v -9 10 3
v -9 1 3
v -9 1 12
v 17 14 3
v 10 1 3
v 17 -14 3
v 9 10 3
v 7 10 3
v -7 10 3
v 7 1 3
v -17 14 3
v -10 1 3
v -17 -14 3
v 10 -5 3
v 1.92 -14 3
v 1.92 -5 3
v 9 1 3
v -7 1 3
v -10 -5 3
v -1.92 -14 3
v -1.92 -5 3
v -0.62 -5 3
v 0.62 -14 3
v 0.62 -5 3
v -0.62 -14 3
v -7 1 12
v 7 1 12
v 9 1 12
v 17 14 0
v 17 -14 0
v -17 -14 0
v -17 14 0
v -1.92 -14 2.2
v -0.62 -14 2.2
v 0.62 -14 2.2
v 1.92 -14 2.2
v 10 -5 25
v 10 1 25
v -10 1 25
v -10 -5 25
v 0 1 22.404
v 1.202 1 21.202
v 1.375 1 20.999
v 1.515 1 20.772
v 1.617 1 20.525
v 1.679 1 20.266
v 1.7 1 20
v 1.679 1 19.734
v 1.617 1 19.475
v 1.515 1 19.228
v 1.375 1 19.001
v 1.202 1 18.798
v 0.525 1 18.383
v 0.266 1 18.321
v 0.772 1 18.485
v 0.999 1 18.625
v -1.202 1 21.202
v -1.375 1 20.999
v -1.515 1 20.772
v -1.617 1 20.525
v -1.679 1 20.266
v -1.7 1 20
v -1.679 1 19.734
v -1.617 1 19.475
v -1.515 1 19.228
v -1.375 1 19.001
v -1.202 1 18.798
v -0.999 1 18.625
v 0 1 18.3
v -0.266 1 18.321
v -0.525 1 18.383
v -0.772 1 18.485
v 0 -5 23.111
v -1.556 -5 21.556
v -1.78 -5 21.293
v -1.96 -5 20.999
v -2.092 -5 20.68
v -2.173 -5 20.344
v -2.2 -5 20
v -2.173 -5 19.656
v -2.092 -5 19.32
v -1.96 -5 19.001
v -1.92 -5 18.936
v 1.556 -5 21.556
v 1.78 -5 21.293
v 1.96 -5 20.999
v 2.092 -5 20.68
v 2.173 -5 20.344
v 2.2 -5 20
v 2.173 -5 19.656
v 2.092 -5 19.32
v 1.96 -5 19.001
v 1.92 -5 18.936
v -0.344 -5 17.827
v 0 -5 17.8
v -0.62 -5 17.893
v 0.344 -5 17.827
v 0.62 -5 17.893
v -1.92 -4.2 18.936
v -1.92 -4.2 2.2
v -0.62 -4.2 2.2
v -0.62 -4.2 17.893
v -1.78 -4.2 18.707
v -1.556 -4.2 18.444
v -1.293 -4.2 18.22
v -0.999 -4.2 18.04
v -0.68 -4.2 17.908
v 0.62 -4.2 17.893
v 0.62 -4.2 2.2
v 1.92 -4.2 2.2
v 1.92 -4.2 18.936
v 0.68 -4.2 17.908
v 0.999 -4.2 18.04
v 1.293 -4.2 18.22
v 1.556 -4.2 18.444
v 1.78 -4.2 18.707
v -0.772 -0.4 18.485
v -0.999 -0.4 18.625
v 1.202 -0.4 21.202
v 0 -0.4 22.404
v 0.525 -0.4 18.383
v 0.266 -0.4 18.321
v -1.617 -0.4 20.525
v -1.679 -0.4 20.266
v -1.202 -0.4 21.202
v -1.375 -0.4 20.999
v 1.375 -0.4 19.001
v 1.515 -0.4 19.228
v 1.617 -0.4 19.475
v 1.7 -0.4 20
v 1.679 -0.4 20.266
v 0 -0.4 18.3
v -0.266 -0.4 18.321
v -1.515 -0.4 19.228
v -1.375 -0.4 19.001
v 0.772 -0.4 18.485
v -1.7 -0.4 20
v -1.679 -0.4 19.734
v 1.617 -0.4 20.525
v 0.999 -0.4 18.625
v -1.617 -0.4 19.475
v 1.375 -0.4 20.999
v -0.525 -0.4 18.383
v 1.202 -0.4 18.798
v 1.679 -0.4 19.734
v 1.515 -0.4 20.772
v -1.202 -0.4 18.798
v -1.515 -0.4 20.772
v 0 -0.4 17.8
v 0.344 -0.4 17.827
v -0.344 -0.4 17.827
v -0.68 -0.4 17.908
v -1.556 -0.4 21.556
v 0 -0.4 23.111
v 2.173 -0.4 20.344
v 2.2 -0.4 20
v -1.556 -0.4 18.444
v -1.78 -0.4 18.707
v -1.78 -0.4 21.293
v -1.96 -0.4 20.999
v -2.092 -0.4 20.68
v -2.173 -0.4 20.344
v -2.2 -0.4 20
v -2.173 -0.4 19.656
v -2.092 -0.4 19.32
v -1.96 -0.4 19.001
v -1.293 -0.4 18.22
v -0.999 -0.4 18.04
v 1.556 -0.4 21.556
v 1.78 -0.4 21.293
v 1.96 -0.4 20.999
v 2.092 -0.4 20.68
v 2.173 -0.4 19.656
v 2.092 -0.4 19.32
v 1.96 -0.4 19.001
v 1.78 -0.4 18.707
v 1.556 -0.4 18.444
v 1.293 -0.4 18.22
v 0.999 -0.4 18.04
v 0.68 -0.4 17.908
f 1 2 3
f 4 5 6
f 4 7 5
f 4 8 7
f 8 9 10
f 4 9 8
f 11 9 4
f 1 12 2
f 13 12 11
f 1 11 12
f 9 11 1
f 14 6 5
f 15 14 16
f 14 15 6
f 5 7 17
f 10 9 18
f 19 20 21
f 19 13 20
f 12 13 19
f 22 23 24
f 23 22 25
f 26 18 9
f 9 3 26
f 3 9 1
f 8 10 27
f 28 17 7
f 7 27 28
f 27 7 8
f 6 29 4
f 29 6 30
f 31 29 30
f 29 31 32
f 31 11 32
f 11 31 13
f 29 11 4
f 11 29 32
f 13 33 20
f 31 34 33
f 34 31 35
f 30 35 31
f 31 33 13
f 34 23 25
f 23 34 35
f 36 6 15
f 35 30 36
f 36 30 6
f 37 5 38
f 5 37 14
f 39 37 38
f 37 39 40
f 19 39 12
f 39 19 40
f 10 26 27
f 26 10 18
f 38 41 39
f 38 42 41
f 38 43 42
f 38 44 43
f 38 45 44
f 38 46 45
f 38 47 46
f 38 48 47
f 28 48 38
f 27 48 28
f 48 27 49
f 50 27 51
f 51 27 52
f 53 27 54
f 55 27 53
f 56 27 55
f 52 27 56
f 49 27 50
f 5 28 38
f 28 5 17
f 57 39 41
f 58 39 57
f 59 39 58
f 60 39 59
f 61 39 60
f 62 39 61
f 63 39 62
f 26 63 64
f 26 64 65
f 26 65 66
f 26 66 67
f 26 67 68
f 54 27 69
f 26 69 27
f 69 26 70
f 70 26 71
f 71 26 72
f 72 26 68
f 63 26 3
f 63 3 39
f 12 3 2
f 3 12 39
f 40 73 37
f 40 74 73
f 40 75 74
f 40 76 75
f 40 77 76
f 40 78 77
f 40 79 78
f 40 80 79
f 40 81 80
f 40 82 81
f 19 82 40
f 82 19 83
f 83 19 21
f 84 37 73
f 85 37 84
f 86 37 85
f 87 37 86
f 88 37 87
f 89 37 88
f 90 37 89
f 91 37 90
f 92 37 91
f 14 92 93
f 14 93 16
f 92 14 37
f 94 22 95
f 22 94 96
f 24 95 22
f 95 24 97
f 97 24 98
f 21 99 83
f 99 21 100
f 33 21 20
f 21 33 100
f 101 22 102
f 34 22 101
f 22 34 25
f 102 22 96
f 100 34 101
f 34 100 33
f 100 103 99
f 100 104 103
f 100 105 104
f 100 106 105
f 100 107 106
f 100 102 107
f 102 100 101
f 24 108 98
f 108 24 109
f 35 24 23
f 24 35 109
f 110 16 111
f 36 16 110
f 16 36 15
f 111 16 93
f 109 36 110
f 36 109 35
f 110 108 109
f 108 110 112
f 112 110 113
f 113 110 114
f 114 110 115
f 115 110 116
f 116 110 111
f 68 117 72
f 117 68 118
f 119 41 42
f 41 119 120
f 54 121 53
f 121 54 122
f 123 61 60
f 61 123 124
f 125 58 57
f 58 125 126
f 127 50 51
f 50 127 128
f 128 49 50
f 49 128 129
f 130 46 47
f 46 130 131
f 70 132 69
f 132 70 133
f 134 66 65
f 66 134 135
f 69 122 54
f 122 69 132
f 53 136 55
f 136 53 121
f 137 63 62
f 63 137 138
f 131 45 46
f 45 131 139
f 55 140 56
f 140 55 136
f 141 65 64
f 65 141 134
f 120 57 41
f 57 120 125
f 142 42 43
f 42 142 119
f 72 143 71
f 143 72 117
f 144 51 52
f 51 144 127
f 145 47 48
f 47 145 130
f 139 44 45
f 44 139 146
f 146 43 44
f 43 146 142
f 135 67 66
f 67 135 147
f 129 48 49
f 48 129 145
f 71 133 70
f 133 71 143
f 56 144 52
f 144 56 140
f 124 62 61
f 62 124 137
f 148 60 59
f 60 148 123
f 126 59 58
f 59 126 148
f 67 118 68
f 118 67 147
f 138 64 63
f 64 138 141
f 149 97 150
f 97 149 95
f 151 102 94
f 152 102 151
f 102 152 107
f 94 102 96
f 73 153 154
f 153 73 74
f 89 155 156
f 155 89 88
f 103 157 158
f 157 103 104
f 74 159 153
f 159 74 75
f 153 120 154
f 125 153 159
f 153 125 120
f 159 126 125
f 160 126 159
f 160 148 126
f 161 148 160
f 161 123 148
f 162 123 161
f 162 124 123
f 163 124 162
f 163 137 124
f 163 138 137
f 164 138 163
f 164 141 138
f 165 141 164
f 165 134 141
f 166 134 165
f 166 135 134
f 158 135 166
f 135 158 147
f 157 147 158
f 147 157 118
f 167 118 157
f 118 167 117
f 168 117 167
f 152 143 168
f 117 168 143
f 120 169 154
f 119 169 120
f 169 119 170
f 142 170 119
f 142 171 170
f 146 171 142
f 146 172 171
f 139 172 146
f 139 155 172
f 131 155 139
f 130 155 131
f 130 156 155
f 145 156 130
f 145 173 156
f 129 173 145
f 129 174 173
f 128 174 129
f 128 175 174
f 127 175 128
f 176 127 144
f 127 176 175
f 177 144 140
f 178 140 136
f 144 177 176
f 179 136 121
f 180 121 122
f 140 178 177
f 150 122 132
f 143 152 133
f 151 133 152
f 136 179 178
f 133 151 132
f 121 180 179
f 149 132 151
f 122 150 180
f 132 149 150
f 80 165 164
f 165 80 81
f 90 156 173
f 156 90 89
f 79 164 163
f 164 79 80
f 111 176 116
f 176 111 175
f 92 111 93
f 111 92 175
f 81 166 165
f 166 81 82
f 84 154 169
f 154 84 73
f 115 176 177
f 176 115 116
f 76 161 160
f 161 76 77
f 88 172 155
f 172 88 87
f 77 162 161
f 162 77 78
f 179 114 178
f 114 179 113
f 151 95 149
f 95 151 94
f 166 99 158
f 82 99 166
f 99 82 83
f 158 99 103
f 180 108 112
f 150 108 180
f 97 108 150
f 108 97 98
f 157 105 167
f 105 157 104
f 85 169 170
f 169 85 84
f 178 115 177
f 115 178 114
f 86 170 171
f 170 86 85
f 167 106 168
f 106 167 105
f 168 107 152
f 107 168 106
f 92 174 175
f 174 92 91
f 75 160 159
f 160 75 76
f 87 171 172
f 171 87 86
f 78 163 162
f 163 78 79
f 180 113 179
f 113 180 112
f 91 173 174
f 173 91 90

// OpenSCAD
// Units: mm. Printable: source_stand, detector_cradle. Other selectors are illustrative proxies.
// Direct grooves, uniform recessed-seat upright, square wall/base junction.
$fn=40;
part="source_stand";
axis_z=20; foot_t=3; bore_d=3.4;
// Uniform wall, no lower block/heel. Front plane remains Y=+1.
plate_t=6; plate_front_y=1; wall_rear_y=plate_front_y-plate_t;
seat_land_t=1.4; flange_seat_y=plate_front_y-seat_land_t;
flange_clearance_d=4.4;
// Independent rectangular open channels, deliberately square at their junction.
lead_pitch=2.54; lead_slot_w=1.3; wall_groove_depth=0.8; base_groove_depth=0.8;
wall_floor_y=wall_rear_y+wall_groove_depth;
base_floor_z=foot_t-base_groove_depth;
// Unmeasured hardware PROXIES. The guide's 2 mm clearance is not a radius spec.
lead_proxy_d=0.8; flange_proxy_t=0.5; flange_proxy_d=3.85;
flange_axial_allowance=1; straight_min_design=2;
upper_bend_r=1.2; base_bend_r=1.2; arc_step=2;
seal_proxy_y=flange_seat_y-flange_proxy_t;
lead_wall_y=wall_floor_y-lead_proxy_d/2;
lead_base_z=base_floor_z+lead_proxy_d/2;
upper_start_y=lead_wall_y+upper_bend_r;
straight_near_seal=seal_proxy_y-upper_start_y;
base_cy=lead_wall_y-base_bend_r; base_cz=lead_base_z+base_bend_r;
assert(lead_pitch-lead_slot_w>=1.2,"Keep separating web >=1.2");
assert(plate_t-wall_groove_depth>=1.2 && seat_land_t>=1.2,"Keep wall/seat material");
assert(base_floor_z>=2,"Keep substantial base floor");
assert(flange_seat_y-flange_axial_allowance-upper_start_y>=straight_min_design-0.001,
       "Increase uniform wall thickness for actual flange/straight/bend requirements");
assert(flange_clearance_d>=4.1+0.3-0.001,"Flange loading clearance");
assert(lead_slot_w>lead_proxy_d && wall_groove_depth>=lead_proxy_d,"Slip groove envelope");
slot_front=-13; slot_rear=7; floor_z=8;
datum_inner_x=22.5; datum_outer_x=25;
datum_y_min=-6; datum_y_max=-2; datum_top_z=14;
assert(datum_inner_x>22,"Body side clearance");
assert(datum_y_min > -8.4 && datum_y_max < 2.4,"Panel corridors stay open");
assert(axis_z==floor_z+15-3,"V11 aperture height mismatch");
assert(slot_front < -12.4 && slot_rear > 6.4,"Full shell clearance");
module box(a,b){translate(a) cube(b-a);}
module across_x(points,half_w){
 multmatrix([[0,0,1,0],[1,0,0,0],[0,1,0,0],[0,0,0,1]])
  linear_extrude(2*half_w,center=true) polygon(points);
}
module roofed_circle(d,y0,y1){
 translate([0,(y0+y1)/2,axis_z]) rotate([90,0,0])
  linear_extrude(y1-y0,center=true)
   polygon(concat([for(a=[135:9:405]) [d/2*cos(a),d/2*sin(a)]],[[0,d/2*sqrt(2)]]));
}
module direct_groove(x){
 // One L-shaped cut: exact square root at [wall_floor_y,base_floor_z].
 // Upper end opens fully into the LED loading recess; no blind roof/lip.
 translate([x,0,0]) across_x([
  [-14.1,base_floor_z],[wall_floor_y,base_floor_z],
  [wall_floor_y,axis_z],[wall_rear_y-0.1,axis_z],
  [wall_rear_y-0.1,foot_t+0.1],[-14.1,foot_t+0.1]],lead_slot_w/2);
}
module source_stand(){
 difference(){
  union(){
   box([-17,-14,0],[17,14,foot_t]);
   box([-10,wall_rear_y,foot_t],[10,plate_front_y,25]);
   for(x=[-9,7]) translate([x,0,0]) rotate([90,0,90])
    linear_extrude(2) polygon([[0,foot_t],[10,foot_t],[0,13]]);
  }
  roofed_circle(bore_d,wall_rear_y-0.1,plate_front_y+0.1);
  // Rear-loaded seat; flange front rests on the 1.4 mm bore land at Y=-0.4.
  roofed_circle(flange_clearance_d,wall_rear_y-0.1,flange_seat_y);
  for(x=[-lead_pitch/2,lead_pitch/2]) direct_groove(x);
 }
}
// Two ordinary 90-degree conductor bends. CAD junction remains square.
function lead_route(x)=concat([[x,seal_proxy_y,axis_z]],
 [for(a=[0:arc_step:90])
  [x,upper_start_y-upper_bend_r*sin(a),axis_z-upper_bend_r+upper_bend_r*cos(a)]],
 [[x,lead_wall_y,base_cz]],
 [for(a=[arc_step:arc_step:90])
  [x,base_cy+base_bend_r*cos(a),base_cz-base_bend_r*sin(a)]],
 [[x,-14,lead_base_z]]);
module tube(points,d){
 // A simple swept proxy mesh keeps previews fast; no hardware STL is exported.
 n=16; m=len(points);
 pts=[for(i=[0:m-1]) let(
  v=points[min(i+1,m-1)]-points[max(i-1,0)],
  normal=[0,-v[2]/norm(v),v[1]/norm(v)])
  for(j=[0:n-1]) points[i]+[d/2*cos(360*j/n),0,0]+normal*d/2*sin(360*j/n)];
 faces=concat([[for(j=[n-1:-1:0]) j]],
  [for(i=[0:m-2]) for(j=[0:n-1]) each
   [[i*n+j,i*n+(j+1)%n,(i+1)*n+(j+1)%n],
    [i*n+j,(i+1)*n+(j+1)%n,(i+1)*n+j]]],
  [[for(j=[0:n-1]) (m-1)*n+j]]);
 polyhedron(pts,faces,convexity=10);
}
module led_proxy(){
 color("crimson") translate([0,flange_seat_y,axis_z]) rotate([-90,0,0]) cylinder(d=3,h=4.8);
 color("darkred") translate([0,seal_proxy_y,axis_z]) rotate([-90,0,0])
  cylinder(d=flange_proxy_d,h=flange_proxy_t);
 for(s=[-1,1]) color(s<0 ? "gold" : "silver") tube(lead_route(s*lead_pitch/2),lead_proxy_d);
}
module source_route_preview(){color("seagreen") source_stand(); led_proxy();}
module source_section_preview(){
 // Cut through positive lead center. Section is illustrative, not another part.
 color("seagreen") intersection(){source_stand();box([-17,-20,-1],[lead_pitch/2,15,26]);}
 led_proxy();
}
module source_entry_preview(){
 // Magnified cutaway of the real modeled seat/entry; hardware is illustrative.
 intersection(){source_section_preview();box([-17,-10,16],[17,8,25.5]);}
}
module detector_cradle(){
 union(){
  box([-25,-19,0],[25,13,floor_z]);
  box([-25,-19,floor_z-0.1],[25,slot_front,14]);
  box([-25,slot_rear,floor_z-0.1],[25,13,14]);
  // Fixed body-only datum tabs; 0.5 mm nominal gap, no clamping preload.
  for(side=[-1,1]) scale([side,1,1])
   box([datum_inner_x,datum_y_min,floor_z-0.1],
       [datum_outer_x,datum_y_max,datum_top_z]);
 }
}
// PROXY ONLY: V11 complete shell, shutter and cover envelopes. Not printable jig.
// Exact datum transform: original x,y,z -> world -x,-z,23-y.
module v11_pose(){translate([0,0,23]) rotate([0,180,0]) rotate([90,0,0]) children();}
module proxy_v11(offset=0){v11_pose(){
 color("slategray") difference(){
  union(){box([-22,-15,0],[22,15,8]);
   for(y=[-15,11.8]) box([-22,y,-6.4],[22,y+3.2,12.4]);}
  for(x=[-5,5]) translate([x,3,-7]) cylinder(d=2,h=21);
 }
 color("orange") translate([offset,0,0]) difference(){
  box([-34,-13,8.4],[22,13,10.4]);
  for(x=[-5,5]) translate([x,3,8]) cylinder(d=4,h=3);
 }
 color("gold") box([-28,-13,-4.4],[21,13,-2.4]);
 // Upward wire proxies, no polarity or channel assignment.
 color("silver") for(x=[-6.27,-3.73,3.73,6.27])
  box([x-0.25,-24,-1.4],[x+0.25,-14,-0.8]);
}}
source_x=0; // -5 left-body-edge, 0 centered, +5 right-body-edge registration
module assembly_preview(){
 color([0.6,0.5,0.35,0.25]) box([-65,-65,-2],[65,35,0]); // board proxy only
 color("teal") detector_cradle();
 proxy_v11();
 // Butted feet: local source +14 meets cradle -19; proxy lens gap 18.2.
 translate([source_x,-33,0]){
  color("seagreen") source_stand();
  led_proxy();
 }
 color([1,0,0,0.4]) translate([source_x,-28.6,axis_z]) rotate([-90,0,0]) cylinder(d=0.35,h=18.2);
}
if(part=="source_stand") source_stand();
else if(part=="detector_cradle") detector_cradle();
else if(part=="assembly") assembly_preview();
else if(part=="source_route") source_route_preview();
else if(part=="section") source_section_preview();
else if(part=="entry") source_entry_preview();
else assert(false,"Unknown part");
